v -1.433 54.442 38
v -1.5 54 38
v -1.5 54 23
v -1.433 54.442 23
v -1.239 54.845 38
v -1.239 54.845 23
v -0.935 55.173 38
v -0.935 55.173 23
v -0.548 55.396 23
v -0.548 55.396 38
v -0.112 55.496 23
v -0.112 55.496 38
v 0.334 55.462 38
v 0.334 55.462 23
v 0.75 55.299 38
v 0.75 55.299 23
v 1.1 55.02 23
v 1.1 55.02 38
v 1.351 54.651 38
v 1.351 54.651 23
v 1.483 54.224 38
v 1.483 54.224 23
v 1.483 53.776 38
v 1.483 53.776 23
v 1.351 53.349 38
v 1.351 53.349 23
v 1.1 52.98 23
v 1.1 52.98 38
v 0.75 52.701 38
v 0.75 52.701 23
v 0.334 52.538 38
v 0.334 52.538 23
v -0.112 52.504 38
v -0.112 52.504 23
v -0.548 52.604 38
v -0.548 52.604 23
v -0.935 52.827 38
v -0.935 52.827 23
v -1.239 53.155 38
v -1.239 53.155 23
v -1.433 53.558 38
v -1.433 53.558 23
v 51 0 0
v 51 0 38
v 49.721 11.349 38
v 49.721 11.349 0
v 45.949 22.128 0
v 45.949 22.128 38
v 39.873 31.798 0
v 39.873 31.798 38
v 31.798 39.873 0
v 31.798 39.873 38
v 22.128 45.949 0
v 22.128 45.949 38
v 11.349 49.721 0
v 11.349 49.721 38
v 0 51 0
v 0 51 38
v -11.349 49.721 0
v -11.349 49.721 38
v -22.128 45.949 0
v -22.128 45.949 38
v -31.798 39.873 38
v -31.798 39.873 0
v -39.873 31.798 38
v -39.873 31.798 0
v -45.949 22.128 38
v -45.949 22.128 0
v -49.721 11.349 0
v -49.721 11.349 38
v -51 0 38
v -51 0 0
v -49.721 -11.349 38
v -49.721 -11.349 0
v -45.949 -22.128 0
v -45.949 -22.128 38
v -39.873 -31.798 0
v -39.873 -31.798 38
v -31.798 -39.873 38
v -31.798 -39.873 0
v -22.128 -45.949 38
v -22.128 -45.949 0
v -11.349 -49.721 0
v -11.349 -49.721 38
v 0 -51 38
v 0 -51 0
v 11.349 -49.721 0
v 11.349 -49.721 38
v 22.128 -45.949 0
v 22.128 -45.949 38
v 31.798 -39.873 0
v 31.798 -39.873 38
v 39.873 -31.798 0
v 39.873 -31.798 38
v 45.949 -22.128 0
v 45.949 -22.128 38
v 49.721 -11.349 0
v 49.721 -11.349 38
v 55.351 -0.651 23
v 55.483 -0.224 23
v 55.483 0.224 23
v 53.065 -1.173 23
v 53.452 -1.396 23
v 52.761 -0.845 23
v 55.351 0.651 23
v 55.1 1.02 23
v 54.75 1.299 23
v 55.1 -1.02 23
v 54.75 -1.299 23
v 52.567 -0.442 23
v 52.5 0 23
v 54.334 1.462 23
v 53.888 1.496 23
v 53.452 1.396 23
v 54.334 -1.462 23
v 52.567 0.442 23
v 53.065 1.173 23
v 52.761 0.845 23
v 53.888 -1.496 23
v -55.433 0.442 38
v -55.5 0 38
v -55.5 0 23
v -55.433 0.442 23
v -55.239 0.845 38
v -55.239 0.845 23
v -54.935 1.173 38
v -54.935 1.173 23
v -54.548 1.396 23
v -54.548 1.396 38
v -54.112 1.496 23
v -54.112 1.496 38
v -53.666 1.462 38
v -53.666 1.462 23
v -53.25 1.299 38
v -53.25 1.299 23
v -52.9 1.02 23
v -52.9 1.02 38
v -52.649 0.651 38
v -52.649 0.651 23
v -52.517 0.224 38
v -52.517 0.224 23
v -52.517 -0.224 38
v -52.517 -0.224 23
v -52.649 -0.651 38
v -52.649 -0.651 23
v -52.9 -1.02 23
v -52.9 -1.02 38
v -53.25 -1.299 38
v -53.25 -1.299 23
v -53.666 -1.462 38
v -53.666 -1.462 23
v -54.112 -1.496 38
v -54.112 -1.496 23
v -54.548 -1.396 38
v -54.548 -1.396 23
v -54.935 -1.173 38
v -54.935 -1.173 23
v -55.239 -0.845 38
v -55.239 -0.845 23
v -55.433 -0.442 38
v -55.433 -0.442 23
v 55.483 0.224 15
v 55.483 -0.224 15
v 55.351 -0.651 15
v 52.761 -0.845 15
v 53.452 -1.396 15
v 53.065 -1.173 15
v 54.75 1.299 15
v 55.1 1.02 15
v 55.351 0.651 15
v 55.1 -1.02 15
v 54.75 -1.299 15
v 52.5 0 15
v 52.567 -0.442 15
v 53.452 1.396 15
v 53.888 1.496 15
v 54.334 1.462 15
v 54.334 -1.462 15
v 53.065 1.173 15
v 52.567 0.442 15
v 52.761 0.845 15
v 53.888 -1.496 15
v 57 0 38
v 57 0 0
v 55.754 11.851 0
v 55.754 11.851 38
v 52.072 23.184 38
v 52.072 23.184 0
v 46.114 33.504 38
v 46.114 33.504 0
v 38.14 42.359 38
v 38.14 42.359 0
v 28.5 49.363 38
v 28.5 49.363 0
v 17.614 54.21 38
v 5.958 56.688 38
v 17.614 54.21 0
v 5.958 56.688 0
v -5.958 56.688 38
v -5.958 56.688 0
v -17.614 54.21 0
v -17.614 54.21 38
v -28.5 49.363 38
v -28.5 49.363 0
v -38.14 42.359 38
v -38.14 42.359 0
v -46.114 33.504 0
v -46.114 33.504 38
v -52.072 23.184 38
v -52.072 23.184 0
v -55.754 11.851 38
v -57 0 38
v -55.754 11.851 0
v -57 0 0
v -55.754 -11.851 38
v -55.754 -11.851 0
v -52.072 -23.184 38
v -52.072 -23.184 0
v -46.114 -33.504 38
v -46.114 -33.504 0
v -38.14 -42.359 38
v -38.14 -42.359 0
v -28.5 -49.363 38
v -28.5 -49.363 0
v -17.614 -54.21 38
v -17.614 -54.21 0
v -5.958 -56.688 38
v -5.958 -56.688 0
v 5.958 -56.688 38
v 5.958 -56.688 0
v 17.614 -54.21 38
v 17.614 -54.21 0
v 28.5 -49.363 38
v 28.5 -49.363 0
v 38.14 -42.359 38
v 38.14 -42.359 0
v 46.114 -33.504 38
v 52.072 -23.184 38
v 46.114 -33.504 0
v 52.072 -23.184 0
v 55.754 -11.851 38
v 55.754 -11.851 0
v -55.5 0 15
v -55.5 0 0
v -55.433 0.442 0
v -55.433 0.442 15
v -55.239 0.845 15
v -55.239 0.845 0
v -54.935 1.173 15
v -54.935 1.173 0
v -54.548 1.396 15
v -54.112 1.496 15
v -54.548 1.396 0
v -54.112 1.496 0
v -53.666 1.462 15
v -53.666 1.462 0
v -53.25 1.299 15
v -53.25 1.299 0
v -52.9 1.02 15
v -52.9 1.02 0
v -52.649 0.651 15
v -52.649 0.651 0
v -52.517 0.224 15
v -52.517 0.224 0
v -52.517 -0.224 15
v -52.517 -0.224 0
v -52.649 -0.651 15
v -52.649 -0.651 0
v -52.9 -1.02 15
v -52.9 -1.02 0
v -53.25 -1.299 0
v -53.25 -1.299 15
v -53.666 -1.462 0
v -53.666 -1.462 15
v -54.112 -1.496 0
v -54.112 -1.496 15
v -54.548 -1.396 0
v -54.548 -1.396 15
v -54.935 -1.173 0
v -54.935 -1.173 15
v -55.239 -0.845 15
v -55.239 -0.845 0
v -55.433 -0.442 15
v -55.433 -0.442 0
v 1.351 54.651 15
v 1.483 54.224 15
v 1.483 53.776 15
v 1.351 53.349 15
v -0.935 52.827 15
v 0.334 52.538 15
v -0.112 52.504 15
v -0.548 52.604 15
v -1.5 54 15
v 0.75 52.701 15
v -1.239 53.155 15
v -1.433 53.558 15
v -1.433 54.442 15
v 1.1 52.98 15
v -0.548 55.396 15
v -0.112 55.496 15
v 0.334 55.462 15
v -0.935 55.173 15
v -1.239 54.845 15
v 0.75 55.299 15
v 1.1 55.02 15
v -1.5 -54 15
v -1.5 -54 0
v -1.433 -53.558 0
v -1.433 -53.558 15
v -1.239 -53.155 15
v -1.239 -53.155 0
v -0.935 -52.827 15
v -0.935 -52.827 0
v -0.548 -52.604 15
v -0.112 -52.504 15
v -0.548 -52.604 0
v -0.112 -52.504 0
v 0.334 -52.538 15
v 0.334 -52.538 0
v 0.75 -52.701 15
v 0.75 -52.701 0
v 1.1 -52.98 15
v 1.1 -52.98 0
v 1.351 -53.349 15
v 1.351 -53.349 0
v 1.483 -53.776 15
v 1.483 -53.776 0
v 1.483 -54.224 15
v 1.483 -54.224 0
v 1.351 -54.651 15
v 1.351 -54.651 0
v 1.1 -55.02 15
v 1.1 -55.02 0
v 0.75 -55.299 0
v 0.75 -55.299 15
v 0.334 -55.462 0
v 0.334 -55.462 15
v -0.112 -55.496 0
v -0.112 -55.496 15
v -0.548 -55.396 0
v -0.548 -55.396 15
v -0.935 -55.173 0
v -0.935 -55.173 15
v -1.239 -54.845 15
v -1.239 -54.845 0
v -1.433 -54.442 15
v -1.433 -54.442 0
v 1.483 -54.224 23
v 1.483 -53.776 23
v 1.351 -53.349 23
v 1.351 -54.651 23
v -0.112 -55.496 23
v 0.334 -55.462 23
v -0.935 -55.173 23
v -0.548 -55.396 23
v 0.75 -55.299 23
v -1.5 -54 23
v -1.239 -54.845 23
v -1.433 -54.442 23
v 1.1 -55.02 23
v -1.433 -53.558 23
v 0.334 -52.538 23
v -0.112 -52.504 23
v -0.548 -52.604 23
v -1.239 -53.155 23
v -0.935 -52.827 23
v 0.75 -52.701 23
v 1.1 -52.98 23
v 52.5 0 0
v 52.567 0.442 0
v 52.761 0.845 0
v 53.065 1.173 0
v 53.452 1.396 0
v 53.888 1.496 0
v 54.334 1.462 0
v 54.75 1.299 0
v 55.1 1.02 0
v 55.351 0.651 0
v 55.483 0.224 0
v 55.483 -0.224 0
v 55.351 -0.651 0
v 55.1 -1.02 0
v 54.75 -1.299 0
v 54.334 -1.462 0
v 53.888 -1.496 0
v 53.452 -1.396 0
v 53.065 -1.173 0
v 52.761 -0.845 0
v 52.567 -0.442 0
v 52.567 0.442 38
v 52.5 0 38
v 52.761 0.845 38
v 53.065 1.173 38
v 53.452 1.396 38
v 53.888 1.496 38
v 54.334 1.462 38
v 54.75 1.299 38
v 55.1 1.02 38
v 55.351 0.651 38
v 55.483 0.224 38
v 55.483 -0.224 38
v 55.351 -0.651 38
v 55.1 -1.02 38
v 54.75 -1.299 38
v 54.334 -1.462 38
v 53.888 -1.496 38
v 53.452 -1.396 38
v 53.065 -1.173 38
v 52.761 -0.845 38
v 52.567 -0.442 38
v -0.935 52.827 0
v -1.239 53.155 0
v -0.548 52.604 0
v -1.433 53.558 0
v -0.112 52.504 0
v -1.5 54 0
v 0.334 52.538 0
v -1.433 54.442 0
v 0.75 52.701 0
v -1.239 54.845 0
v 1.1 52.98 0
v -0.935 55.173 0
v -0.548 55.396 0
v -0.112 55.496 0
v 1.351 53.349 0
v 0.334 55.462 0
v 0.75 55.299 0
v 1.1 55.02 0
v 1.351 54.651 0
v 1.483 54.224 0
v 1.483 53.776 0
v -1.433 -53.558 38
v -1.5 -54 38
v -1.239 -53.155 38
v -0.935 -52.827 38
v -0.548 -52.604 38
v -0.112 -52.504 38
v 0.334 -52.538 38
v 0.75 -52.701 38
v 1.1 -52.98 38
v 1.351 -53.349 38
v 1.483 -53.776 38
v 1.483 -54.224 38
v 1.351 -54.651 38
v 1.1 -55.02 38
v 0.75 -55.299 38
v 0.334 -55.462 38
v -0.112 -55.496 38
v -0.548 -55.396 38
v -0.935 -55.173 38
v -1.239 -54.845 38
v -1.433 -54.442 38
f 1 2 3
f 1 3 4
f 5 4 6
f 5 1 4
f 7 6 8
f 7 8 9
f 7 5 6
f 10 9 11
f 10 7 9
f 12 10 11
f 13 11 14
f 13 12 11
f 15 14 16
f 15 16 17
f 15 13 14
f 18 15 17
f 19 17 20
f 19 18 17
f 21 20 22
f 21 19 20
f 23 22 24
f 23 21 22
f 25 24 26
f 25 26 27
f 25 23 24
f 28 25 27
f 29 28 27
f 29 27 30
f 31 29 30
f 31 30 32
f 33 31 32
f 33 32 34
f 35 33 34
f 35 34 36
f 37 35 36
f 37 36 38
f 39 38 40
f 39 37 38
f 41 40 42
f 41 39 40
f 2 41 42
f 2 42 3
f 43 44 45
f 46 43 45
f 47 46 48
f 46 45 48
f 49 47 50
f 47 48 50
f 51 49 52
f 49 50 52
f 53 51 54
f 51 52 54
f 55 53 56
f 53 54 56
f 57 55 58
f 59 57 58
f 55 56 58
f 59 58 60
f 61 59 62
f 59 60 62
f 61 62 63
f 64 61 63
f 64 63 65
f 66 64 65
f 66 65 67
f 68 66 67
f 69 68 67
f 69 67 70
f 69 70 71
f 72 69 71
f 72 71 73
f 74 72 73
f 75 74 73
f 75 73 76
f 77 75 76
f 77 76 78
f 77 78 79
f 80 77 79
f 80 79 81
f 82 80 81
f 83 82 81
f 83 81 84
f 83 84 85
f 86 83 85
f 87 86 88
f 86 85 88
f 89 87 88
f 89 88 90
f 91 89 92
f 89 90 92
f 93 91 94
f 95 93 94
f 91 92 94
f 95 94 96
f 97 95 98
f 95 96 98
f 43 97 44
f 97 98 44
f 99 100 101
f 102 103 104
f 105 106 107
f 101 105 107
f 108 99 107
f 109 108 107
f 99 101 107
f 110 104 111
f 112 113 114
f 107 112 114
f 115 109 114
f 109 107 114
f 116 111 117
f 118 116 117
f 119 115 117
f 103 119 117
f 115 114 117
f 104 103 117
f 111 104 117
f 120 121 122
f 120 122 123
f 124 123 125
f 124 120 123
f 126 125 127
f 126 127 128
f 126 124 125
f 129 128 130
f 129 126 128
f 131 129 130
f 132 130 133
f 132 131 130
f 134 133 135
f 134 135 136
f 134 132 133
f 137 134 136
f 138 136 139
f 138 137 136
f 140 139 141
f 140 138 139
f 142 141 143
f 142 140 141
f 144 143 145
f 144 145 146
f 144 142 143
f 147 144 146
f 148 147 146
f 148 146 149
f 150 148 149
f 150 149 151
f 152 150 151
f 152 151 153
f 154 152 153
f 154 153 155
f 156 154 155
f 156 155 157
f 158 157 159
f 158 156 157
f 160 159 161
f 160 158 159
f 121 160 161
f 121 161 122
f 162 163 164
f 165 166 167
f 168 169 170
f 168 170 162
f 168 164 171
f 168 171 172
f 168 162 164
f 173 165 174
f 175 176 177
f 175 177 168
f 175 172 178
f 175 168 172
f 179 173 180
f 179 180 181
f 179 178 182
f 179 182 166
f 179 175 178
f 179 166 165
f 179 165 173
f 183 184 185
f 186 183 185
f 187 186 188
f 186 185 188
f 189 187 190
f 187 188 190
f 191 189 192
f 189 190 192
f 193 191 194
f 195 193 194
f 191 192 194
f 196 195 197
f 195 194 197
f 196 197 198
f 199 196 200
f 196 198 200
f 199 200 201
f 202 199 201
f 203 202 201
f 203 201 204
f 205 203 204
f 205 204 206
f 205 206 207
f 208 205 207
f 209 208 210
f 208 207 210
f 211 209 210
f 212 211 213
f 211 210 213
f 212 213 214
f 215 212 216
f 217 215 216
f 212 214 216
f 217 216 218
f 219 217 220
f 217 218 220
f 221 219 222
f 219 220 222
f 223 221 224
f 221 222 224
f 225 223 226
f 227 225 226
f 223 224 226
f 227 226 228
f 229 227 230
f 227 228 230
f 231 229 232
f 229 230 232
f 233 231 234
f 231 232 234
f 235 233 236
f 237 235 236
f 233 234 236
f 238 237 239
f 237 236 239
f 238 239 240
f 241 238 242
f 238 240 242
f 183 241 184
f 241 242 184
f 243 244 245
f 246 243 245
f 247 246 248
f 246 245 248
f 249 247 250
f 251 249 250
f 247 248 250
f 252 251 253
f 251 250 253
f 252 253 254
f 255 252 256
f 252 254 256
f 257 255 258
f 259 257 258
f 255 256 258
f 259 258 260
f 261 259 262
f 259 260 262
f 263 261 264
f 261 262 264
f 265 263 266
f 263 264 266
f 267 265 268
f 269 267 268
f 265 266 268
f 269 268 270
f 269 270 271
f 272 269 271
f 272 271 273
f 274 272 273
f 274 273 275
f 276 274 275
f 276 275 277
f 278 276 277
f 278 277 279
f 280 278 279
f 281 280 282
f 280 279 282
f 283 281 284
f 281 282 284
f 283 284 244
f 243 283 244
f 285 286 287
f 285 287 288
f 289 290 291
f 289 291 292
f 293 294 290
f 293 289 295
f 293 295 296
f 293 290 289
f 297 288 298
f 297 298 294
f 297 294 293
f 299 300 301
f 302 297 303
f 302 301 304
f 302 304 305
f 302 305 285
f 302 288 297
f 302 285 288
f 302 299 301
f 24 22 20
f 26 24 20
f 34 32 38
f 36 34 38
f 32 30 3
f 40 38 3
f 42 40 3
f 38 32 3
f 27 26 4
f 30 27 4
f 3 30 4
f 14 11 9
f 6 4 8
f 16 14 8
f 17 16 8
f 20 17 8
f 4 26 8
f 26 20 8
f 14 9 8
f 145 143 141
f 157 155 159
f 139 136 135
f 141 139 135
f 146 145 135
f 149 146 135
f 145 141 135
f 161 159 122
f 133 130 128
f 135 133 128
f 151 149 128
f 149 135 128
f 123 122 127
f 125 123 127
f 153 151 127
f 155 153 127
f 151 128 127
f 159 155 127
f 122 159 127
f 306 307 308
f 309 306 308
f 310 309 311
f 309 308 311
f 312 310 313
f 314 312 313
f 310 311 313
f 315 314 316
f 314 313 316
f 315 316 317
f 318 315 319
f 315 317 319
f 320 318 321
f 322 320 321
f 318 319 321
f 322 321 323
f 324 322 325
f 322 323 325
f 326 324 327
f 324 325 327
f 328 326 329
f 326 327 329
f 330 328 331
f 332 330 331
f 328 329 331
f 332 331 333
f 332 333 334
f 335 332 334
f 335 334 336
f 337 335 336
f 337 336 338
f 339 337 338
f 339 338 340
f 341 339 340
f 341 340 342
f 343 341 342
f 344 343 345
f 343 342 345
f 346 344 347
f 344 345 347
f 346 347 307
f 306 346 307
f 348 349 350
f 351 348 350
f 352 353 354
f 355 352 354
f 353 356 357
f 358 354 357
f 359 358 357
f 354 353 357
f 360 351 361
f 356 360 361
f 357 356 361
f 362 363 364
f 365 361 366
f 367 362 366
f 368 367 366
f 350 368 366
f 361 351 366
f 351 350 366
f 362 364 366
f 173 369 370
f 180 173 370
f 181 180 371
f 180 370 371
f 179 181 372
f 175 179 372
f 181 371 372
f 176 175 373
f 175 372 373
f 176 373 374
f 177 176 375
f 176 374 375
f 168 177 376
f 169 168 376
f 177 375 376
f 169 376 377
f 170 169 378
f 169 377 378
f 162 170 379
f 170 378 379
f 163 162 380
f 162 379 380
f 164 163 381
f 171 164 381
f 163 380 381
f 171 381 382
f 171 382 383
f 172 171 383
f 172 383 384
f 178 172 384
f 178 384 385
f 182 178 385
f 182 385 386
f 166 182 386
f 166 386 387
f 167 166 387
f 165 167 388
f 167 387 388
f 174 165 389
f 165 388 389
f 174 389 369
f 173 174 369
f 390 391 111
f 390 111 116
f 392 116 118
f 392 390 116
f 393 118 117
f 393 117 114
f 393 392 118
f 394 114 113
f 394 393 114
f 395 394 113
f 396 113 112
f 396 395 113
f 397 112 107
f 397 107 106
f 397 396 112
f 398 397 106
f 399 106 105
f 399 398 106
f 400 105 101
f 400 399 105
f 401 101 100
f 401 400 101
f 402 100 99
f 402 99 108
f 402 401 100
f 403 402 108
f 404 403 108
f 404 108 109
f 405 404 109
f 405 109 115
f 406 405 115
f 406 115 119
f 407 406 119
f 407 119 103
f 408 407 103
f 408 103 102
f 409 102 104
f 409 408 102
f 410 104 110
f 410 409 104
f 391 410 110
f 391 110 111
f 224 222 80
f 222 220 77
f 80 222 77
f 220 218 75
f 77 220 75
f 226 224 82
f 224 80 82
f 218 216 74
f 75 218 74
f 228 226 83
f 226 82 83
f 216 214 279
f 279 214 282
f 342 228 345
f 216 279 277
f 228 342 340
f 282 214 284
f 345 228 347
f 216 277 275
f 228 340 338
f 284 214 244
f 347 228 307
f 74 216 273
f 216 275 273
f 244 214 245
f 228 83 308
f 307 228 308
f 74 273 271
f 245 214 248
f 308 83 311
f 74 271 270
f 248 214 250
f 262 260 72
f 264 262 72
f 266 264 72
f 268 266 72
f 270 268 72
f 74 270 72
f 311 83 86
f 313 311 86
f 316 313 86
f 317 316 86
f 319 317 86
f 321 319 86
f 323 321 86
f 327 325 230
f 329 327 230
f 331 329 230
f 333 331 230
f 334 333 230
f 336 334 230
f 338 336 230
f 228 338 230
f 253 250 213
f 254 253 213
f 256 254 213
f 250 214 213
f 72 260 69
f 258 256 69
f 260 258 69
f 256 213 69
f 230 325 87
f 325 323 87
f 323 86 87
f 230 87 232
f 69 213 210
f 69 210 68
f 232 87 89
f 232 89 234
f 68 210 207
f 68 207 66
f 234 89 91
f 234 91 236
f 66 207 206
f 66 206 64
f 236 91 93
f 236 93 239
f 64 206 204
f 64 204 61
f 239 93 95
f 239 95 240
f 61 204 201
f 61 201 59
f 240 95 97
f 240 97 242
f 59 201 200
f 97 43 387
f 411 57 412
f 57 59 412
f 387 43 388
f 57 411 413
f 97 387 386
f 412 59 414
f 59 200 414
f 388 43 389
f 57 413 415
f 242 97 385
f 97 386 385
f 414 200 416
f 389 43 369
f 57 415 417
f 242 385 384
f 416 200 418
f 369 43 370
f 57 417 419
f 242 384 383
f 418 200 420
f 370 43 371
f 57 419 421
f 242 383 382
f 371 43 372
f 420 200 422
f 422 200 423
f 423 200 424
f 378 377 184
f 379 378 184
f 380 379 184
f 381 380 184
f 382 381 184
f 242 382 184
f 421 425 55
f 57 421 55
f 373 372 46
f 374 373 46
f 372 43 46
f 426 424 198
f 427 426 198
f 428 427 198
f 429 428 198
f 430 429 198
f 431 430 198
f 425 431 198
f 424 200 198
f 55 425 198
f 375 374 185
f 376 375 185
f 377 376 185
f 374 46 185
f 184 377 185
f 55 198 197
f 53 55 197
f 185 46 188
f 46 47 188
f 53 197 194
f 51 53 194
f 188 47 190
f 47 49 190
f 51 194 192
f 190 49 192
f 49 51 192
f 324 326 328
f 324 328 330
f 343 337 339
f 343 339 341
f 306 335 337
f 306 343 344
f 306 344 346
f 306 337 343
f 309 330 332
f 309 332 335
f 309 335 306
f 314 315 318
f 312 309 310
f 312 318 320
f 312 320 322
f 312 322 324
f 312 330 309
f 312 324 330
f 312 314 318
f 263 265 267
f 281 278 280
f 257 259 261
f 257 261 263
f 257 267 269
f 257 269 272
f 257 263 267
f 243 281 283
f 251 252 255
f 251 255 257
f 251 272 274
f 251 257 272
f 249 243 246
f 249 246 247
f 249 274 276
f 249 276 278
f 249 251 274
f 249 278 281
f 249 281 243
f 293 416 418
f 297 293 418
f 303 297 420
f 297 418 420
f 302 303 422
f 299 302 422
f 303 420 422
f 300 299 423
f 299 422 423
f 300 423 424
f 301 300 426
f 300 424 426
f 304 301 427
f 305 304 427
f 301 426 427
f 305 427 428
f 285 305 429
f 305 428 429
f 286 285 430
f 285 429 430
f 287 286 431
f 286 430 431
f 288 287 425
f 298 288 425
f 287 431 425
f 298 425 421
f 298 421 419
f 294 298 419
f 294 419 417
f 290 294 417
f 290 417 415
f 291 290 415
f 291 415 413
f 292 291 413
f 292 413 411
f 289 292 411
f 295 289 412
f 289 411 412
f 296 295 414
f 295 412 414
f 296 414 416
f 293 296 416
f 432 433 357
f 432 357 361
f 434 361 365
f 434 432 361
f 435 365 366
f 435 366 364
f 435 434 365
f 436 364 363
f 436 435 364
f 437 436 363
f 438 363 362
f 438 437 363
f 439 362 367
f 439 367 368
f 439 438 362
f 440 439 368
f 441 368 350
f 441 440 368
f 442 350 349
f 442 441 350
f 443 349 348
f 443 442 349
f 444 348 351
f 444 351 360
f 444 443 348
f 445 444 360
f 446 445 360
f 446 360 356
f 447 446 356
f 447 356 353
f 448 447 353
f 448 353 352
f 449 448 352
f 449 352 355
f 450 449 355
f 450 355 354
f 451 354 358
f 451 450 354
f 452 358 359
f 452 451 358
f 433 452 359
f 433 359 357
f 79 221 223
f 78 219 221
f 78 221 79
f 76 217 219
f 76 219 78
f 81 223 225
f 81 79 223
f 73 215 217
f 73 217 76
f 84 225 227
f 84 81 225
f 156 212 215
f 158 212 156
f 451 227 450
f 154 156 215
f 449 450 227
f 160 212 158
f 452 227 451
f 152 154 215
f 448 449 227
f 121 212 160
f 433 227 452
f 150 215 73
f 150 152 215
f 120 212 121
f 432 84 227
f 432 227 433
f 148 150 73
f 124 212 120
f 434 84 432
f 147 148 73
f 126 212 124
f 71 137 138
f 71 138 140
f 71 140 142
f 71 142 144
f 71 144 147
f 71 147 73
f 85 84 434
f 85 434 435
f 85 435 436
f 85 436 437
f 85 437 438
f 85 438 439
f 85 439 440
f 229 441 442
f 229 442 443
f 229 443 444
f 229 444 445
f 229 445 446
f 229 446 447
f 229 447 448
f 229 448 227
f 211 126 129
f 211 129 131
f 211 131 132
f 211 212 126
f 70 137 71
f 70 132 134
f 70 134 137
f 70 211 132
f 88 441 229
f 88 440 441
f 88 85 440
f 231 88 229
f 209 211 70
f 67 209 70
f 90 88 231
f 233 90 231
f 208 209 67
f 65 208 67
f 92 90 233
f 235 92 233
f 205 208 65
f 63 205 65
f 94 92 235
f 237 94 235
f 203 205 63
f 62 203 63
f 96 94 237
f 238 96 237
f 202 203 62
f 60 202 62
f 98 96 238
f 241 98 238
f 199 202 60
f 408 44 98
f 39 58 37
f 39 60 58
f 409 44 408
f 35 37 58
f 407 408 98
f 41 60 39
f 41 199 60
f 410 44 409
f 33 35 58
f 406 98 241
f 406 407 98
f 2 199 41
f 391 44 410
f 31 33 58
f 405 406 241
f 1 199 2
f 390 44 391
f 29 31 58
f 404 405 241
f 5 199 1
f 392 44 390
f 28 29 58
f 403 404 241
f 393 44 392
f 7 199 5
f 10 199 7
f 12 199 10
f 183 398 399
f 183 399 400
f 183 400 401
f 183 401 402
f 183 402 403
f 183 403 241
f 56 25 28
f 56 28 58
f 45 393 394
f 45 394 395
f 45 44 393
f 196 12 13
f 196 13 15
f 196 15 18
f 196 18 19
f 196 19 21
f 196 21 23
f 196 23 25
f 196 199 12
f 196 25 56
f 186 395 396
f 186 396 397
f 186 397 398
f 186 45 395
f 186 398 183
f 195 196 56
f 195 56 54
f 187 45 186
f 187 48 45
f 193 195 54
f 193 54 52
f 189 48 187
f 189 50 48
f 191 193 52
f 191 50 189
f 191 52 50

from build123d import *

# Parameters (mm, degrees)
SKETCH1_R           = 57
BOSS_EXTRUDE1_DEPTH = 38
SKETCH2_R           = 51
CUT_EXTRUDE1_DEPTH  = 39
SKETCH4_R           = 1.5
CUT_EXTRUDE3_DEPTH  = 15


with BuildPart() as part:
    # Sketch1 → Boss-Extrude1 (new body)
    with BuildSketch(Plane.XY):
        Circle(SKETCH1_R)
    extrude(amount=BOSS_EXTRUDE1_DEPTH)

    # Sketch2 → Cut-Extrude1 (cut)
    with BuildSketch(Plane.XY.offset(38)):
        Circle(SKETCH2_R)
    extrude(amount=-CUT_EXTRUDE1_DEPTH, mode=Mode.SUBTRACT)

    # Sketch4 → Cut-Extrude3 (cut)
    with BuildSketch(Plane(origin=(0, 0, 0), x_dir=(-1, 0, 0), z_dir=(0, 0, -1))):
        with Locations((0, 54)):
            Circle(SKETCH4_R)
        with Locations((54, 0)):
            Circle(SKETCH4_R)
        with Locations((0, -54)):
            Circle(SKETCH4_R)
        with Locations((-54, 0)):
            Circle(SKETCH4_R)
    cut_extrude3 = extrude(amount=-CUT_EXTRUDE3_DEPTH, mode=Mode.SUBTRACT)

    # Mirror1: Cut-Extrude3 across plane
    add(cut_extrude3.mirror(Plane.XY.offset(19)), mode=Mode.SUBTRACT)


solid = part.part
